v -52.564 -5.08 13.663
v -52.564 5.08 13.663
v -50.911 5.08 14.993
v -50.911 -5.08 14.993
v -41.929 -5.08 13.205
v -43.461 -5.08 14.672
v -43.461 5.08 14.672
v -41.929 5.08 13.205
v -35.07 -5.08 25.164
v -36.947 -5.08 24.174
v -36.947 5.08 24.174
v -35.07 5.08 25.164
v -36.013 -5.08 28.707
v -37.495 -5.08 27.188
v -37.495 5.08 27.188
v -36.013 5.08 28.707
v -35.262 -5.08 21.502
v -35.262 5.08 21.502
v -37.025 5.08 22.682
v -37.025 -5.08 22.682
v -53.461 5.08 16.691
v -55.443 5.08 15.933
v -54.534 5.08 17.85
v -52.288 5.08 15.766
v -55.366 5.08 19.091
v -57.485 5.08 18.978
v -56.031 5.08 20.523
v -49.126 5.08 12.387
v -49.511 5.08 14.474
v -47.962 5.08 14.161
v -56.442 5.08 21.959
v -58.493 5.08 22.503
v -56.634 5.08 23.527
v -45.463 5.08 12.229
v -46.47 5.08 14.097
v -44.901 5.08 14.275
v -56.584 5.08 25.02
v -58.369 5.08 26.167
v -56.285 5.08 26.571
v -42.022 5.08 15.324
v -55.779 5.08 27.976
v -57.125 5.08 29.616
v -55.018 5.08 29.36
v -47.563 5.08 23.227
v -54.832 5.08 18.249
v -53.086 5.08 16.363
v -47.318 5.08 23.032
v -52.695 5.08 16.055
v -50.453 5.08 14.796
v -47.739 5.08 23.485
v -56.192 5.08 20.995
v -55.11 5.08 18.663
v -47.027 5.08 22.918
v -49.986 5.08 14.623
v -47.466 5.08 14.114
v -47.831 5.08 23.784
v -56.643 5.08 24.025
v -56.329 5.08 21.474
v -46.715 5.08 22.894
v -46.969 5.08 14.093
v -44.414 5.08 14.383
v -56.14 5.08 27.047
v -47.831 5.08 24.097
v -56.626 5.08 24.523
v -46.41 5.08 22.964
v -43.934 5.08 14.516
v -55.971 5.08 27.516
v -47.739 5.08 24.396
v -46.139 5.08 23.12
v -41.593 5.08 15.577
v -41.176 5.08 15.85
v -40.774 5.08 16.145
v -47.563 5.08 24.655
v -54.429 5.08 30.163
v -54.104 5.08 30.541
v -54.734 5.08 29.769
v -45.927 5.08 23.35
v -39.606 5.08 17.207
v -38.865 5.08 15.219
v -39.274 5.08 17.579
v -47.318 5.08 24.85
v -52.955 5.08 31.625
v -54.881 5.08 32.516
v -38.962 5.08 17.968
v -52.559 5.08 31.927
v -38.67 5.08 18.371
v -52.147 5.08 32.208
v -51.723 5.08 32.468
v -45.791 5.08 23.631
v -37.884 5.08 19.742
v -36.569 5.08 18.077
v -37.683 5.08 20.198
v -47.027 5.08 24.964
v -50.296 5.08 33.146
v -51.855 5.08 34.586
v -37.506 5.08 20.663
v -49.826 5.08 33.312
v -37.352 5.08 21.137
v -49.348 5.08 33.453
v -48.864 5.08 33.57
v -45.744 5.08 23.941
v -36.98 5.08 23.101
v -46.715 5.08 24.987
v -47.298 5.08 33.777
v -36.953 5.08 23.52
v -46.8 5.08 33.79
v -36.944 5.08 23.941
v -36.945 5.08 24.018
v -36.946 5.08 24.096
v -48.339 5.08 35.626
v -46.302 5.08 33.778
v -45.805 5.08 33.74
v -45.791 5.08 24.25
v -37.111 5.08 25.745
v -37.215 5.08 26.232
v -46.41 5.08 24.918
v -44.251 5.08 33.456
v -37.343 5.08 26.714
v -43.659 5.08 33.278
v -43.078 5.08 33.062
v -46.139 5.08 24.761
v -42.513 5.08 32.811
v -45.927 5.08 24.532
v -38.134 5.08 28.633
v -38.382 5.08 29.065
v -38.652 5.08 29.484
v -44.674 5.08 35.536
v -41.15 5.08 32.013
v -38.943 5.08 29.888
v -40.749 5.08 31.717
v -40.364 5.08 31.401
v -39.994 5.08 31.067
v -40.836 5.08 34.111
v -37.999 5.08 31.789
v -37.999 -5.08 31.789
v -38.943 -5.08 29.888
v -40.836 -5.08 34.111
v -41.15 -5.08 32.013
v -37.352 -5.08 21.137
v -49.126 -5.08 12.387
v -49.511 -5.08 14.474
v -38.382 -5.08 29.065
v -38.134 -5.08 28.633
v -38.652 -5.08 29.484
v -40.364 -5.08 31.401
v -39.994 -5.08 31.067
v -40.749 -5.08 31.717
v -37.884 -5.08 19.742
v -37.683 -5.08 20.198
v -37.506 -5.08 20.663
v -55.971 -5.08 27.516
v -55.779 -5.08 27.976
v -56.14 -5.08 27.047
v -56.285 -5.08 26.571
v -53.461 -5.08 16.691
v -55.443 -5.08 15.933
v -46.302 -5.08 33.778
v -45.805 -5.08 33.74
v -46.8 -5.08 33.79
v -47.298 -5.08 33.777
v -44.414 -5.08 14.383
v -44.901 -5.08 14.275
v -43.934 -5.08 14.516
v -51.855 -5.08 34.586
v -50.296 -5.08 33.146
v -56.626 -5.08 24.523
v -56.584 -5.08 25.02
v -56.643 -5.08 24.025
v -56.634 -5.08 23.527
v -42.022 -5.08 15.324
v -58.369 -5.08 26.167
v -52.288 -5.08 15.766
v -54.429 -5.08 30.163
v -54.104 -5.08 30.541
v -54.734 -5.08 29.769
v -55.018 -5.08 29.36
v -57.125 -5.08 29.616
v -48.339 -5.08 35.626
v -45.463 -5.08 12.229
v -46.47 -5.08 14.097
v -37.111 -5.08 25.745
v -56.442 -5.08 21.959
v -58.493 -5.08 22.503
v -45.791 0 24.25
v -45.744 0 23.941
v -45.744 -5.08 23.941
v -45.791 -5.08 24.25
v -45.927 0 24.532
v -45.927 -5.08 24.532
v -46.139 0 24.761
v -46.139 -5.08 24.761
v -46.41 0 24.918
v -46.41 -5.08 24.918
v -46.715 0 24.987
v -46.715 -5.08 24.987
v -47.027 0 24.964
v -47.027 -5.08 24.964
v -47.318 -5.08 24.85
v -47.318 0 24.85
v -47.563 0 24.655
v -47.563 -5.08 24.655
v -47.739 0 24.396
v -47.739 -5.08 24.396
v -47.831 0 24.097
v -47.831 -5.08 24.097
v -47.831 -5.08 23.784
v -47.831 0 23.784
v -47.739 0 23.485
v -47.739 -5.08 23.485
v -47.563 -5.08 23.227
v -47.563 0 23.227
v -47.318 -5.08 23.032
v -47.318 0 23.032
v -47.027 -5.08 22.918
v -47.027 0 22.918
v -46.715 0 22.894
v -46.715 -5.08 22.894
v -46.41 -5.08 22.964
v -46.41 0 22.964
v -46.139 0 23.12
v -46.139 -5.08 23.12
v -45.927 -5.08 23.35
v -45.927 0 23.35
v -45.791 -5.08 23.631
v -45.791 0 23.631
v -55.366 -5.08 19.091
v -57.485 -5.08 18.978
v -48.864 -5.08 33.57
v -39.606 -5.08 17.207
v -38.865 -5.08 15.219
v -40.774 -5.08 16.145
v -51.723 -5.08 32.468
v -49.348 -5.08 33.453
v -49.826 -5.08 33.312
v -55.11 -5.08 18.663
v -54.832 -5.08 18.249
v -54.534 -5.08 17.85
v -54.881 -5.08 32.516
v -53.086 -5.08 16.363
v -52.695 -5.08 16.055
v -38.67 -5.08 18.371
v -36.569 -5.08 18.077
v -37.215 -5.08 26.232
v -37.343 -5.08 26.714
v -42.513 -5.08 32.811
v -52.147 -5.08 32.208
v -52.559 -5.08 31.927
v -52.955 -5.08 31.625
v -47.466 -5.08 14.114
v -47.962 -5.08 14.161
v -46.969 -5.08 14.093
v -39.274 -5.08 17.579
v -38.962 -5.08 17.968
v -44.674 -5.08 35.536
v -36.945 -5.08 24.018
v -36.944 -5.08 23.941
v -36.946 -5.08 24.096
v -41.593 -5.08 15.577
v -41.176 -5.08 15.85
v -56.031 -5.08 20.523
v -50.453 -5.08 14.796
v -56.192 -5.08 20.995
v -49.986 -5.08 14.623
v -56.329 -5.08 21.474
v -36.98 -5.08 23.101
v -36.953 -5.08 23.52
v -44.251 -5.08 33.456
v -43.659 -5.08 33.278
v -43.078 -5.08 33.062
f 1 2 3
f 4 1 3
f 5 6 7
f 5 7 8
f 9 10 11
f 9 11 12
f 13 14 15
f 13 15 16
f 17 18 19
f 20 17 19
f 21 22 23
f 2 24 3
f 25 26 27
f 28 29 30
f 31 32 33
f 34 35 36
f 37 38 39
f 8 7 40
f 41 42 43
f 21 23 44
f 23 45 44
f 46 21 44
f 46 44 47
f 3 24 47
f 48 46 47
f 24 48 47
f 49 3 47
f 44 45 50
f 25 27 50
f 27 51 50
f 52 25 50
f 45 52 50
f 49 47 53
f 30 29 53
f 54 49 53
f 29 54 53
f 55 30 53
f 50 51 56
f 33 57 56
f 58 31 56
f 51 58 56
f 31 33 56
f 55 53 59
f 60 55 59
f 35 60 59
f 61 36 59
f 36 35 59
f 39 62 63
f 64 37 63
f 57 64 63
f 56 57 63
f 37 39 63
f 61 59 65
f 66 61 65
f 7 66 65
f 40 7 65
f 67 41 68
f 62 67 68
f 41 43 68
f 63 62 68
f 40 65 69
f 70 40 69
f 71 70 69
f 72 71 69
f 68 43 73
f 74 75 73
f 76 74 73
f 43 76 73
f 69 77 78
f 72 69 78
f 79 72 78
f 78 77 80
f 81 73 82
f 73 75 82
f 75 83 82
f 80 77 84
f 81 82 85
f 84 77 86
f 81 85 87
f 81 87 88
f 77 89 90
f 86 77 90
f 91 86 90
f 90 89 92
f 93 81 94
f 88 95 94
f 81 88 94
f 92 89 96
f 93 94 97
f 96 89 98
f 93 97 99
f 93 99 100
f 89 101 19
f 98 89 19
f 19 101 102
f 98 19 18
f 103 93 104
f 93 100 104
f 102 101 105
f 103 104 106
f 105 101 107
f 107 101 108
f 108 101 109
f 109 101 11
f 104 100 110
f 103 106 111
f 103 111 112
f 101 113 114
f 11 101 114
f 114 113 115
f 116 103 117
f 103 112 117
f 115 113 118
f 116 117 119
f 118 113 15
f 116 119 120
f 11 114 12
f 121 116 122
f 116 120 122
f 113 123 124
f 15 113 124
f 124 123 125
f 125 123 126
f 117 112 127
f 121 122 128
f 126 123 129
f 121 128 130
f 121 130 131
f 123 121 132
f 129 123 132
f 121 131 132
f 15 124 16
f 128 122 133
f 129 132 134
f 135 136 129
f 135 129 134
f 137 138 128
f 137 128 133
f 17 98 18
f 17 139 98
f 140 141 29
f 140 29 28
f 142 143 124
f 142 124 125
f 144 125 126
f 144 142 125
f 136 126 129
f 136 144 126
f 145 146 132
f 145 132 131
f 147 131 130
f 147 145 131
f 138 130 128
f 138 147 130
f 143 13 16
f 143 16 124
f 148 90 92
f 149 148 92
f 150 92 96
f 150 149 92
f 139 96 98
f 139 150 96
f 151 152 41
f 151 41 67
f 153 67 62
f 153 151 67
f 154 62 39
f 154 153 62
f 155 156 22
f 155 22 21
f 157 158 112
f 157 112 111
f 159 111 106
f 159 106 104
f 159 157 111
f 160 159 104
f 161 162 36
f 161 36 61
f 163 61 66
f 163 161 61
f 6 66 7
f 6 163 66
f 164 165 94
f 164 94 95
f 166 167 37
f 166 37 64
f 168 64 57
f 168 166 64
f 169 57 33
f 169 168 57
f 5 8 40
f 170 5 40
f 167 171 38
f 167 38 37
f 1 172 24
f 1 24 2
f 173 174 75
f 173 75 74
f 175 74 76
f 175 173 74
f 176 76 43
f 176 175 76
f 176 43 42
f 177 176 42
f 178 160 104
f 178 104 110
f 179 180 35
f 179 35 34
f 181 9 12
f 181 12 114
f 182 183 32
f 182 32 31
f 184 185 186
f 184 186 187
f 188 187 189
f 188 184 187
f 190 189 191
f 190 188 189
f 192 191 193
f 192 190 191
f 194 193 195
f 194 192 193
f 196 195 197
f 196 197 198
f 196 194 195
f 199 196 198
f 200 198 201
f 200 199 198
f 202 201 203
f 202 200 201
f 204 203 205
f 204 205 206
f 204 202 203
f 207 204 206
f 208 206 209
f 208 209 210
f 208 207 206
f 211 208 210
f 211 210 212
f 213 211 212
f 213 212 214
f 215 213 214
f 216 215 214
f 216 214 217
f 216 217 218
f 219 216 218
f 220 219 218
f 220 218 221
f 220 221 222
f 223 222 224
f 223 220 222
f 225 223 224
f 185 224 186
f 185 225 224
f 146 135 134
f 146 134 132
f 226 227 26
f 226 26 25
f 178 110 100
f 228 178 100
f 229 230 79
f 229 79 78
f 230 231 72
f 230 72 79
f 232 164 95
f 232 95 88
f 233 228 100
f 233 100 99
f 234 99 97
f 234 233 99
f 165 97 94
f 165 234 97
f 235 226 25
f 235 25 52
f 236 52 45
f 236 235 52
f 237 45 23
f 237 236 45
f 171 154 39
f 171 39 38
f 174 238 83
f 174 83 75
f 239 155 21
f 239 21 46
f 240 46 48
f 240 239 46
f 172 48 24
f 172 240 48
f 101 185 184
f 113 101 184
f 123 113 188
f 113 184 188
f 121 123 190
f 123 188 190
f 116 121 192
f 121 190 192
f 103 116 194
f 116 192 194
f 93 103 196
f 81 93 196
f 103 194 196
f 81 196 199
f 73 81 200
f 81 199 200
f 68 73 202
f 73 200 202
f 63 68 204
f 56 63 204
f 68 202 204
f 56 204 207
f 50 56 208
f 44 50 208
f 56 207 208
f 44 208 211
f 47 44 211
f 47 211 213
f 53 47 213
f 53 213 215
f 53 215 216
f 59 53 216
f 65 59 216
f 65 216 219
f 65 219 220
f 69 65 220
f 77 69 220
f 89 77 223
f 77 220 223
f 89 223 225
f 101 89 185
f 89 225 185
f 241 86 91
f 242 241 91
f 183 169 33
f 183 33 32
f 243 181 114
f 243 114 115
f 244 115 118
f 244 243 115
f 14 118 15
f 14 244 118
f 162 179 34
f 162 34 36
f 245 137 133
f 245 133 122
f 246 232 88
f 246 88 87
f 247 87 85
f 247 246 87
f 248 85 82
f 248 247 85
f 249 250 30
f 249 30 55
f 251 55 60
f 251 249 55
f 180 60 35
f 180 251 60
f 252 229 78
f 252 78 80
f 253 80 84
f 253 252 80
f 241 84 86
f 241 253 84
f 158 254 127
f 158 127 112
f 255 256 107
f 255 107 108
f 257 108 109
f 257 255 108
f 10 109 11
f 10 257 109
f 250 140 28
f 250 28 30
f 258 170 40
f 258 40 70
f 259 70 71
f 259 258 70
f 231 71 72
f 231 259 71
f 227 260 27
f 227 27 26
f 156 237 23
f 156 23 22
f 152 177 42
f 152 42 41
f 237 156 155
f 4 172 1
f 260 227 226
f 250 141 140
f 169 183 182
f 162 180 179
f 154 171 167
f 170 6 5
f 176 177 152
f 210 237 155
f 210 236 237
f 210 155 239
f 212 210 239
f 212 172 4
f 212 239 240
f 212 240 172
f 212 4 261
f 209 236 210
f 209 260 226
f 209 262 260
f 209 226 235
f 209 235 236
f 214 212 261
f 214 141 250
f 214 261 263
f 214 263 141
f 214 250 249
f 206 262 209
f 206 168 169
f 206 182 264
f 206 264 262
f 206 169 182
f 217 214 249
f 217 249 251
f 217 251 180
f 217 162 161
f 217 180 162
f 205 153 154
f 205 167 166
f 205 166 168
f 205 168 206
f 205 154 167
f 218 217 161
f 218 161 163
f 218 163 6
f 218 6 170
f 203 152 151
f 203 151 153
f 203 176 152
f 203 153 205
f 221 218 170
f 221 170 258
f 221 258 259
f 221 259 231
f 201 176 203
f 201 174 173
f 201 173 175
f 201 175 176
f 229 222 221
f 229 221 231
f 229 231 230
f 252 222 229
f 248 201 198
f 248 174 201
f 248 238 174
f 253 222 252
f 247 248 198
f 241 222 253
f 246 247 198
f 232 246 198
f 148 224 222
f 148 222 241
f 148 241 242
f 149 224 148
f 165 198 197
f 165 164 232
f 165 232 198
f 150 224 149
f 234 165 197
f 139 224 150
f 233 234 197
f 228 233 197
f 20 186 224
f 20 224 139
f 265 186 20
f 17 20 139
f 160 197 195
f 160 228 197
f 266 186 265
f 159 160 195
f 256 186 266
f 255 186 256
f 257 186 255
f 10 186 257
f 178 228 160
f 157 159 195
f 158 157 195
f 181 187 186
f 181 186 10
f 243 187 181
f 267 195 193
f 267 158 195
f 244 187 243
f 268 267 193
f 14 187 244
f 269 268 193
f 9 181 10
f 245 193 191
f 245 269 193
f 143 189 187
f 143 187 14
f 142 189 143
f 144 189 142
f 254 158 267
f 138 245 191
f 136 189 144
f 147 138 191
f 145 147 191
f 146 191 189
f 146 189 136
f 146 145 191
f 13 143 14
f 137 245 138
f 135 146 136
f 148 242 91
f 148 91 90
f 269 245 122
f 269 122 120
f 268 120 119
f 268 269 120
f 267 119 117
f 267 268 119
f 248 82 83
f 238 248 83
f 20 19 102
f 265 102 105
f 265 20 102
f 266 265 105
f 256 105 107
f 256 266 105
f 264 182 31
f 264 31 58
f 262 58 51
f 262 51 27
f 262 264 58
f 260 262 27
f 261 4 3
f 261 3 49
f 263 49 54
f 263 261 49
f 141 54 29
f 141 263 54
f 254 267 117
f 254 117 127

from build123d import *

# Parameters (mm, degrees)
F0_R          = 1.049364
F1_DEPTH      = 5.08
F1_DEPTH_BACK = 5.08


with BuildPart() as f1:
    # F0 (on Front) → F1 (new body, two sides)
    with BuildSketch(Plane.XZ) as f1_sk:
        with BuildLine():
            ThreePointArc((-37.025139, 22.682322), (-36.964615, 23.310248), (-36.944413, 23.940761))
            ThreePointArc((-36.944413, 23.940761), (-36.945103, 24.057295), (-36.947171, 24.173813))
            ThreePointArc((-36.947171, 24.173813), (-36.997563, 24.962594), (-37.111039, 25.744795))
            ThreePointArc((-37.111039, 25.744795), (-37.275689, 26.473733), (-37.495132, 27.188089))
            ThreePointArc((-37.495132, 27.188089), (-37.785454, 27.923227), (-38.133787, 28.632719))
            ThreePointArc((-38.133787, 28.632719), (-38.514452, 29.275801), (-38.942779, 29.88817))
            ThreePointArc((-38.942779, 29.88817), (-39.444941, 30.498537), (-39.994428, 31.066674))
            ThreePointArc((-39.994428, 31.066674), (-40.554276, 31.561679), (-41.150044, 32.012812))
            ThreePointArc((-41.150044, 32.012812), (-41.81546, 32.439352), (-42.512935, 32.811163))
            ThreePointArc((-42.512935, 32.811163), (-43.366856, 33.17471), (-44.251205, 33.456268))
            ThreePointArc((-44.251205, 33.456268), (-45.022377, 33.629499), (-45.804956, 33.740337))
            ThreePointArc((-45.804956, 33.740337), (-46.550793, 33.7871), (-47.298029, 33.777179))
            ThreePointArc((-47.298029, 33.777179), (-48.085122, 33.705072), (-48.863899, 33.570085))
            ThreePointArc((-48.863899, 33.570085), (-49.588023, 33.385412), (-50.296062, 33.146369))
            ThreePointArc((-50.296062, 33.146369), (-51.022921, 32.835901), (-51.722546, 32.468151))
            ThreePointArc((-51.722546, 32.468151), (-52.354895, 32.069911), (-52.955229, 31.624873))
            ThreePointArc((-52.955229, 31.624873), (-53.551528, 31.106083), (-54.104308, 30.541151))
            ThreePointArc((-54.104308, 30.541151), (-54.583698, 29.967875), (-55.018244, 29.359903))
            ThreePointArc((-55.018244, 29.359903), (-55.426287, 28.682987), (-55.778739, 27.975532))
            ThreePointArc((-55.778739, 27.975532), (-56.058788, 27.282688), (-56.2855, 26.570605))
            ThreePointArc((-56.2855, 26.570605), (-56.465808, 25.801057), (-56.58383, 25.019529))
            ThreePointArc((-56.58383, 25.019529), (-56.637441, 24.274153), (-56.634385, 23.526858))
            ThreePointArc((-56.634385, 23.526858), (-56.569511, 22.739135), (-56.441684, 21.959151))
            ThreePointArc((-56.441684, 21.959151), (-56.26367, 21.233361), (-56.031141, 20.523157))
            ThreePointArc((-56.031141, 20.523157), (-55.727363, 19.793476), (-55.366055, 19.090503))
            ThreePointArc((-55.366055, 19.090503), (-54.97364, 18.454523), (-54.534136, 17.850126))
            ThreePointArc((-54.534136, 17.850126), (-54.020845, 17.249087), (-53.461014, 16.69114))
            ThreePointArc((-53.461014, 16.69114), (-52.892167, 16.206504), (-52.288212, 15.766392))
            ThreePointArc((-52.288212, 15.766392), (-51.615072, 15.352148), (-50.910885, 14.993212))
            ThreePointArc((-50.910885, 14.993212), (-50.220642, 14.706811), (-49.510672, 14.473567))
            ThreePointArc((-49.510672, 14.473567), (-48.742813, 14.286198), (-47.962402, 14.161002))
            ThreePointArc((-47.962402, 14.161002), (-47.21755, 14.100547), (-46.470258, 14.096738))
            ThreePointArc((-46.470258, 14.096738), (-45.681973, 14.154373), (-44.900848, 14.27503))
            ThreePointArc((-44.900848, 14.27503), (-44.173453, 14.446369), (-43.461143, 14.672365))
            ThreePointArc((-43.461143, 14.672365), (-42.728702, 14.969428), (-42.02244, 15.324263))
            ThreePointArc((-42.02244, 15.324263), (-41.382882, 15.710819), (-40.774473, 16.144753))
            ThreePointArc((-40.774473, 16.144753), (-40.168744, 16.652501), (-39.605679, 17.207183))
            ThreePointArc((-39.605679, 17.207183), (-39.115838, 17.771555), (-38.670197, 18.371442))
            ThreePointArc((-38.670197, 18.371442), (-38.249787, 19.040748), (-37.884398, 19.741608))
            ThreePointArc((-37.884398, 19.741608), (-37.591668, 20.429191), (-37.351913, 21.136988))
            ThreePointArc((-37.351913, 21.136988), (-37.157498, 21.903094), (-37.025139, 22.682322))
        make_face()
        with Locations((-46.793749, 23.940761)):
            Circle(F0_R, mode=Mode.SUBTRACT)
        with BuildLine():
            ThreePointArc((-37.111039, 25.744795), (-36.997563, 24.962594), (-36.947171, 24.173813))
            Line((-36.947171, 24.173813), (-35.07041, 25.163614))
            Line((-35.07041, 25.163614), (-37.111039, 25.744795))
        make_face()
        with BuildLine():
            Line((-35.261809, 21.502234), (-37.025139, 22.682322))
            ThreePointArc((-37.025139, 22.682322), (-37.157498, 21.903094), (-37.351913, 21.136988))
            Line((-37.351913, 21.136988), (-35.261809, 21.502234))
        make_face()
        with BuildLine():
            ThreePointArc((-38.133787, 28.632719), (-37.785454, 27.923227), (-37.495132, 27.188089))
            Line((-37.495132, 27.188089), (-36.013299, 28.706677))
            Line((-36.013299, 28.706677), (-38.133787, 28.632719))
        make_face()
        with BuildLine():
            Line((-36.568978, 18.076794), (-37.884398, 19.741608))
            ThreePointArc((-37.884398, 19.741608), (-38.249787, 19.040748), (-38.670197, 18.371442))
            Line((-38.670197, 18.371442), (-36.568978, 18.076794))
        make_face()
        with BuildLine():
            ThreePointArc((-39.994428, 31.066674), (-39.444941, 30.498537), (-38.942779, 29.88817))
            Line((-38.942779, 29.88817), (-37.999248, 31.788615))
            Line((-37.999248, 31.788615), (-39.994428, 31.066674))
        make_face()
        with BuildLine():
            Line((-38.865442, 15.21872), (-39.605679, 17.207183))
            ThreePointArc((-39.605679, 17.207183), (-40.168744, 16.652501), (-40.774473, 16.144753))
            Line((-40.774473, 16.144753), (-38.865442, 15.21872))
        make_face()
        with BuildLine():
            ThreePointArc((-42.512935, 32.811163), (-41.81546, 32.439352), (-41.150044, 32.012812))
            Line((-41.150044, 32.012812), (-40.836107, 34.111235))
            Line((-40.836107, 34.111235), (-42.512935, 32.811163))
        make_face()
        with BuildLine():
            Line((-41.929007, 13.204544), (-42.02244, 15.324263))
            ThreePointArc((-42.02244, 15.324263), (-42.728702, 14.969428), (-43.461143, 14.672365))
            Line((-43.461143, 14.672365), (-41.929007, 13.204544))
        make_face()
        with BuildLine():
            ThreePointArc((-45.804956, 33.740337), (-45.022377, 33.629499), (-44.251205, 33.456268))
            Line((-44.251205, 33.456268), (-44.673904, 35.535514))
            Line((-44.673904, 35.535514), (-45.804956, 33.740337))
        make_face()
        with BuildLine():
            Line((-45.463259, 12.229149), (-44.900848, 14.27503))
            ThreePointArc((-44.900848, 14.27503), (-45.681973, 14.154373), (-46.470258, 14.096738))
            Line((-46.470258, 14.096738), (-45.463259, 12.229149))
        make_face()
        with BuildLine():
            ThreePointArc((-48.863899, 33.570085), (-48.085122, 33.705072), (-47.298029, 33.777179))
            Line((-47.298029, 33.777179), (-48.339167, 35.625954))
            Line((-48.339167, 35.625954), (-48.863899, 33.570085))
        make_face()
        with BuildLine():
            Line((-49.126242, 12.386907), (-47.962402, 14.161002))
            ThreePointArc((-47.962402, 14.161002), (-48.742813, 14.286198), (-49.510672, 14.473567))
            Line((-49.510672, 14.473567), (-49.126242, 12.386907))
        make_face()
        with BuildLine():
            ThreePointArc((-51.722546, 32.468151), (-51.022921, 32.835901), (-50.296062, 33.146369))
            Line((-50.296062, 33.146369), (-51.854904, 34.585796))
            Line((-51.854904, 34.585796), (-51.722546, 32.468151))
        make_face()
        with BuildLine():
            Line((-52.563546, 13.662555), (-50.910885, 14.993212))
            ThreePointArc((-50.910885, 14.993212), (-51.615072, 15.352148), (-52.288212, 15.766392))
            Line((-52.288212, 15.766392), (-52.563546, 13.662555))
        make_face()
        with BuildLine():
            ThreePointArc((-54.104308, 30.541151), (-53.551528, 31.106083), (-52.955229, 31.624873))
            Line((-52.955229, 31.624873), (-54.88095, 32.51568))
            Line((-54.88095, 32.51568), (-54.104308, 30.541151))
        make_face()
        with BuildLine():
            Line((-55.442594, 15.932668), (-53.461014, 16.69114))
            ThreePointArc((-53.461014, 16.69114), (-54.020845, 17.249087), (-54.534136, 17.850126))
            Line((-54.534136, 17.850126), (-55.442594, 15.932668))
        make_face()
        with BuildLine():
            ThreePointArc((-55.778739, 27.975532), (-55.426287, 28.682987), (-55.018244, 29.359903))
            Line((-55.018244, 29.359903), (-57.124521, 29.6159))
            Line((-57.124521, 29.6159), (-55.778739, 27.975532))
        make_face()
        with BuildLine():
            Line((-57.484826, 18.977603), (-55.366055, 19.090503))
            ThreePointArc((-55.366055, 19.090503), (-55.727363, 19.793476), (-56.031141, 20.523157))
            Line((-56.031141, 20.523157), (-57.484826, 18.977603))
        make_face()
        with BuildLine():
            ThreePointArc((-56.58383, 25.019529), (-56.465808, 25.801057), (-56.2855, 26.570605))
            Line((-56.2855, 26.570605), (-58.368541, 26.167024))
            Line((-58.368541, 26.167024), (-56.58383, 25.019529))
        make_face()
        with BuildLine():
            Line((-58.492645, 22.502746), (-56.441684, 21.959151))
            ThreePointArc((-56.441684, 21.959151), (-56.569511, 22.739135), (-56.634385, 23.526858))
            Line((-56.634385, 23.526858), (-58.492645, 22.502746))
        make_face()
    extrude(amount=F1_DEPTH)
    extrude(f1_sk.sketch, amount=-F1_DEPTH_BACK)


solid = f1.part
